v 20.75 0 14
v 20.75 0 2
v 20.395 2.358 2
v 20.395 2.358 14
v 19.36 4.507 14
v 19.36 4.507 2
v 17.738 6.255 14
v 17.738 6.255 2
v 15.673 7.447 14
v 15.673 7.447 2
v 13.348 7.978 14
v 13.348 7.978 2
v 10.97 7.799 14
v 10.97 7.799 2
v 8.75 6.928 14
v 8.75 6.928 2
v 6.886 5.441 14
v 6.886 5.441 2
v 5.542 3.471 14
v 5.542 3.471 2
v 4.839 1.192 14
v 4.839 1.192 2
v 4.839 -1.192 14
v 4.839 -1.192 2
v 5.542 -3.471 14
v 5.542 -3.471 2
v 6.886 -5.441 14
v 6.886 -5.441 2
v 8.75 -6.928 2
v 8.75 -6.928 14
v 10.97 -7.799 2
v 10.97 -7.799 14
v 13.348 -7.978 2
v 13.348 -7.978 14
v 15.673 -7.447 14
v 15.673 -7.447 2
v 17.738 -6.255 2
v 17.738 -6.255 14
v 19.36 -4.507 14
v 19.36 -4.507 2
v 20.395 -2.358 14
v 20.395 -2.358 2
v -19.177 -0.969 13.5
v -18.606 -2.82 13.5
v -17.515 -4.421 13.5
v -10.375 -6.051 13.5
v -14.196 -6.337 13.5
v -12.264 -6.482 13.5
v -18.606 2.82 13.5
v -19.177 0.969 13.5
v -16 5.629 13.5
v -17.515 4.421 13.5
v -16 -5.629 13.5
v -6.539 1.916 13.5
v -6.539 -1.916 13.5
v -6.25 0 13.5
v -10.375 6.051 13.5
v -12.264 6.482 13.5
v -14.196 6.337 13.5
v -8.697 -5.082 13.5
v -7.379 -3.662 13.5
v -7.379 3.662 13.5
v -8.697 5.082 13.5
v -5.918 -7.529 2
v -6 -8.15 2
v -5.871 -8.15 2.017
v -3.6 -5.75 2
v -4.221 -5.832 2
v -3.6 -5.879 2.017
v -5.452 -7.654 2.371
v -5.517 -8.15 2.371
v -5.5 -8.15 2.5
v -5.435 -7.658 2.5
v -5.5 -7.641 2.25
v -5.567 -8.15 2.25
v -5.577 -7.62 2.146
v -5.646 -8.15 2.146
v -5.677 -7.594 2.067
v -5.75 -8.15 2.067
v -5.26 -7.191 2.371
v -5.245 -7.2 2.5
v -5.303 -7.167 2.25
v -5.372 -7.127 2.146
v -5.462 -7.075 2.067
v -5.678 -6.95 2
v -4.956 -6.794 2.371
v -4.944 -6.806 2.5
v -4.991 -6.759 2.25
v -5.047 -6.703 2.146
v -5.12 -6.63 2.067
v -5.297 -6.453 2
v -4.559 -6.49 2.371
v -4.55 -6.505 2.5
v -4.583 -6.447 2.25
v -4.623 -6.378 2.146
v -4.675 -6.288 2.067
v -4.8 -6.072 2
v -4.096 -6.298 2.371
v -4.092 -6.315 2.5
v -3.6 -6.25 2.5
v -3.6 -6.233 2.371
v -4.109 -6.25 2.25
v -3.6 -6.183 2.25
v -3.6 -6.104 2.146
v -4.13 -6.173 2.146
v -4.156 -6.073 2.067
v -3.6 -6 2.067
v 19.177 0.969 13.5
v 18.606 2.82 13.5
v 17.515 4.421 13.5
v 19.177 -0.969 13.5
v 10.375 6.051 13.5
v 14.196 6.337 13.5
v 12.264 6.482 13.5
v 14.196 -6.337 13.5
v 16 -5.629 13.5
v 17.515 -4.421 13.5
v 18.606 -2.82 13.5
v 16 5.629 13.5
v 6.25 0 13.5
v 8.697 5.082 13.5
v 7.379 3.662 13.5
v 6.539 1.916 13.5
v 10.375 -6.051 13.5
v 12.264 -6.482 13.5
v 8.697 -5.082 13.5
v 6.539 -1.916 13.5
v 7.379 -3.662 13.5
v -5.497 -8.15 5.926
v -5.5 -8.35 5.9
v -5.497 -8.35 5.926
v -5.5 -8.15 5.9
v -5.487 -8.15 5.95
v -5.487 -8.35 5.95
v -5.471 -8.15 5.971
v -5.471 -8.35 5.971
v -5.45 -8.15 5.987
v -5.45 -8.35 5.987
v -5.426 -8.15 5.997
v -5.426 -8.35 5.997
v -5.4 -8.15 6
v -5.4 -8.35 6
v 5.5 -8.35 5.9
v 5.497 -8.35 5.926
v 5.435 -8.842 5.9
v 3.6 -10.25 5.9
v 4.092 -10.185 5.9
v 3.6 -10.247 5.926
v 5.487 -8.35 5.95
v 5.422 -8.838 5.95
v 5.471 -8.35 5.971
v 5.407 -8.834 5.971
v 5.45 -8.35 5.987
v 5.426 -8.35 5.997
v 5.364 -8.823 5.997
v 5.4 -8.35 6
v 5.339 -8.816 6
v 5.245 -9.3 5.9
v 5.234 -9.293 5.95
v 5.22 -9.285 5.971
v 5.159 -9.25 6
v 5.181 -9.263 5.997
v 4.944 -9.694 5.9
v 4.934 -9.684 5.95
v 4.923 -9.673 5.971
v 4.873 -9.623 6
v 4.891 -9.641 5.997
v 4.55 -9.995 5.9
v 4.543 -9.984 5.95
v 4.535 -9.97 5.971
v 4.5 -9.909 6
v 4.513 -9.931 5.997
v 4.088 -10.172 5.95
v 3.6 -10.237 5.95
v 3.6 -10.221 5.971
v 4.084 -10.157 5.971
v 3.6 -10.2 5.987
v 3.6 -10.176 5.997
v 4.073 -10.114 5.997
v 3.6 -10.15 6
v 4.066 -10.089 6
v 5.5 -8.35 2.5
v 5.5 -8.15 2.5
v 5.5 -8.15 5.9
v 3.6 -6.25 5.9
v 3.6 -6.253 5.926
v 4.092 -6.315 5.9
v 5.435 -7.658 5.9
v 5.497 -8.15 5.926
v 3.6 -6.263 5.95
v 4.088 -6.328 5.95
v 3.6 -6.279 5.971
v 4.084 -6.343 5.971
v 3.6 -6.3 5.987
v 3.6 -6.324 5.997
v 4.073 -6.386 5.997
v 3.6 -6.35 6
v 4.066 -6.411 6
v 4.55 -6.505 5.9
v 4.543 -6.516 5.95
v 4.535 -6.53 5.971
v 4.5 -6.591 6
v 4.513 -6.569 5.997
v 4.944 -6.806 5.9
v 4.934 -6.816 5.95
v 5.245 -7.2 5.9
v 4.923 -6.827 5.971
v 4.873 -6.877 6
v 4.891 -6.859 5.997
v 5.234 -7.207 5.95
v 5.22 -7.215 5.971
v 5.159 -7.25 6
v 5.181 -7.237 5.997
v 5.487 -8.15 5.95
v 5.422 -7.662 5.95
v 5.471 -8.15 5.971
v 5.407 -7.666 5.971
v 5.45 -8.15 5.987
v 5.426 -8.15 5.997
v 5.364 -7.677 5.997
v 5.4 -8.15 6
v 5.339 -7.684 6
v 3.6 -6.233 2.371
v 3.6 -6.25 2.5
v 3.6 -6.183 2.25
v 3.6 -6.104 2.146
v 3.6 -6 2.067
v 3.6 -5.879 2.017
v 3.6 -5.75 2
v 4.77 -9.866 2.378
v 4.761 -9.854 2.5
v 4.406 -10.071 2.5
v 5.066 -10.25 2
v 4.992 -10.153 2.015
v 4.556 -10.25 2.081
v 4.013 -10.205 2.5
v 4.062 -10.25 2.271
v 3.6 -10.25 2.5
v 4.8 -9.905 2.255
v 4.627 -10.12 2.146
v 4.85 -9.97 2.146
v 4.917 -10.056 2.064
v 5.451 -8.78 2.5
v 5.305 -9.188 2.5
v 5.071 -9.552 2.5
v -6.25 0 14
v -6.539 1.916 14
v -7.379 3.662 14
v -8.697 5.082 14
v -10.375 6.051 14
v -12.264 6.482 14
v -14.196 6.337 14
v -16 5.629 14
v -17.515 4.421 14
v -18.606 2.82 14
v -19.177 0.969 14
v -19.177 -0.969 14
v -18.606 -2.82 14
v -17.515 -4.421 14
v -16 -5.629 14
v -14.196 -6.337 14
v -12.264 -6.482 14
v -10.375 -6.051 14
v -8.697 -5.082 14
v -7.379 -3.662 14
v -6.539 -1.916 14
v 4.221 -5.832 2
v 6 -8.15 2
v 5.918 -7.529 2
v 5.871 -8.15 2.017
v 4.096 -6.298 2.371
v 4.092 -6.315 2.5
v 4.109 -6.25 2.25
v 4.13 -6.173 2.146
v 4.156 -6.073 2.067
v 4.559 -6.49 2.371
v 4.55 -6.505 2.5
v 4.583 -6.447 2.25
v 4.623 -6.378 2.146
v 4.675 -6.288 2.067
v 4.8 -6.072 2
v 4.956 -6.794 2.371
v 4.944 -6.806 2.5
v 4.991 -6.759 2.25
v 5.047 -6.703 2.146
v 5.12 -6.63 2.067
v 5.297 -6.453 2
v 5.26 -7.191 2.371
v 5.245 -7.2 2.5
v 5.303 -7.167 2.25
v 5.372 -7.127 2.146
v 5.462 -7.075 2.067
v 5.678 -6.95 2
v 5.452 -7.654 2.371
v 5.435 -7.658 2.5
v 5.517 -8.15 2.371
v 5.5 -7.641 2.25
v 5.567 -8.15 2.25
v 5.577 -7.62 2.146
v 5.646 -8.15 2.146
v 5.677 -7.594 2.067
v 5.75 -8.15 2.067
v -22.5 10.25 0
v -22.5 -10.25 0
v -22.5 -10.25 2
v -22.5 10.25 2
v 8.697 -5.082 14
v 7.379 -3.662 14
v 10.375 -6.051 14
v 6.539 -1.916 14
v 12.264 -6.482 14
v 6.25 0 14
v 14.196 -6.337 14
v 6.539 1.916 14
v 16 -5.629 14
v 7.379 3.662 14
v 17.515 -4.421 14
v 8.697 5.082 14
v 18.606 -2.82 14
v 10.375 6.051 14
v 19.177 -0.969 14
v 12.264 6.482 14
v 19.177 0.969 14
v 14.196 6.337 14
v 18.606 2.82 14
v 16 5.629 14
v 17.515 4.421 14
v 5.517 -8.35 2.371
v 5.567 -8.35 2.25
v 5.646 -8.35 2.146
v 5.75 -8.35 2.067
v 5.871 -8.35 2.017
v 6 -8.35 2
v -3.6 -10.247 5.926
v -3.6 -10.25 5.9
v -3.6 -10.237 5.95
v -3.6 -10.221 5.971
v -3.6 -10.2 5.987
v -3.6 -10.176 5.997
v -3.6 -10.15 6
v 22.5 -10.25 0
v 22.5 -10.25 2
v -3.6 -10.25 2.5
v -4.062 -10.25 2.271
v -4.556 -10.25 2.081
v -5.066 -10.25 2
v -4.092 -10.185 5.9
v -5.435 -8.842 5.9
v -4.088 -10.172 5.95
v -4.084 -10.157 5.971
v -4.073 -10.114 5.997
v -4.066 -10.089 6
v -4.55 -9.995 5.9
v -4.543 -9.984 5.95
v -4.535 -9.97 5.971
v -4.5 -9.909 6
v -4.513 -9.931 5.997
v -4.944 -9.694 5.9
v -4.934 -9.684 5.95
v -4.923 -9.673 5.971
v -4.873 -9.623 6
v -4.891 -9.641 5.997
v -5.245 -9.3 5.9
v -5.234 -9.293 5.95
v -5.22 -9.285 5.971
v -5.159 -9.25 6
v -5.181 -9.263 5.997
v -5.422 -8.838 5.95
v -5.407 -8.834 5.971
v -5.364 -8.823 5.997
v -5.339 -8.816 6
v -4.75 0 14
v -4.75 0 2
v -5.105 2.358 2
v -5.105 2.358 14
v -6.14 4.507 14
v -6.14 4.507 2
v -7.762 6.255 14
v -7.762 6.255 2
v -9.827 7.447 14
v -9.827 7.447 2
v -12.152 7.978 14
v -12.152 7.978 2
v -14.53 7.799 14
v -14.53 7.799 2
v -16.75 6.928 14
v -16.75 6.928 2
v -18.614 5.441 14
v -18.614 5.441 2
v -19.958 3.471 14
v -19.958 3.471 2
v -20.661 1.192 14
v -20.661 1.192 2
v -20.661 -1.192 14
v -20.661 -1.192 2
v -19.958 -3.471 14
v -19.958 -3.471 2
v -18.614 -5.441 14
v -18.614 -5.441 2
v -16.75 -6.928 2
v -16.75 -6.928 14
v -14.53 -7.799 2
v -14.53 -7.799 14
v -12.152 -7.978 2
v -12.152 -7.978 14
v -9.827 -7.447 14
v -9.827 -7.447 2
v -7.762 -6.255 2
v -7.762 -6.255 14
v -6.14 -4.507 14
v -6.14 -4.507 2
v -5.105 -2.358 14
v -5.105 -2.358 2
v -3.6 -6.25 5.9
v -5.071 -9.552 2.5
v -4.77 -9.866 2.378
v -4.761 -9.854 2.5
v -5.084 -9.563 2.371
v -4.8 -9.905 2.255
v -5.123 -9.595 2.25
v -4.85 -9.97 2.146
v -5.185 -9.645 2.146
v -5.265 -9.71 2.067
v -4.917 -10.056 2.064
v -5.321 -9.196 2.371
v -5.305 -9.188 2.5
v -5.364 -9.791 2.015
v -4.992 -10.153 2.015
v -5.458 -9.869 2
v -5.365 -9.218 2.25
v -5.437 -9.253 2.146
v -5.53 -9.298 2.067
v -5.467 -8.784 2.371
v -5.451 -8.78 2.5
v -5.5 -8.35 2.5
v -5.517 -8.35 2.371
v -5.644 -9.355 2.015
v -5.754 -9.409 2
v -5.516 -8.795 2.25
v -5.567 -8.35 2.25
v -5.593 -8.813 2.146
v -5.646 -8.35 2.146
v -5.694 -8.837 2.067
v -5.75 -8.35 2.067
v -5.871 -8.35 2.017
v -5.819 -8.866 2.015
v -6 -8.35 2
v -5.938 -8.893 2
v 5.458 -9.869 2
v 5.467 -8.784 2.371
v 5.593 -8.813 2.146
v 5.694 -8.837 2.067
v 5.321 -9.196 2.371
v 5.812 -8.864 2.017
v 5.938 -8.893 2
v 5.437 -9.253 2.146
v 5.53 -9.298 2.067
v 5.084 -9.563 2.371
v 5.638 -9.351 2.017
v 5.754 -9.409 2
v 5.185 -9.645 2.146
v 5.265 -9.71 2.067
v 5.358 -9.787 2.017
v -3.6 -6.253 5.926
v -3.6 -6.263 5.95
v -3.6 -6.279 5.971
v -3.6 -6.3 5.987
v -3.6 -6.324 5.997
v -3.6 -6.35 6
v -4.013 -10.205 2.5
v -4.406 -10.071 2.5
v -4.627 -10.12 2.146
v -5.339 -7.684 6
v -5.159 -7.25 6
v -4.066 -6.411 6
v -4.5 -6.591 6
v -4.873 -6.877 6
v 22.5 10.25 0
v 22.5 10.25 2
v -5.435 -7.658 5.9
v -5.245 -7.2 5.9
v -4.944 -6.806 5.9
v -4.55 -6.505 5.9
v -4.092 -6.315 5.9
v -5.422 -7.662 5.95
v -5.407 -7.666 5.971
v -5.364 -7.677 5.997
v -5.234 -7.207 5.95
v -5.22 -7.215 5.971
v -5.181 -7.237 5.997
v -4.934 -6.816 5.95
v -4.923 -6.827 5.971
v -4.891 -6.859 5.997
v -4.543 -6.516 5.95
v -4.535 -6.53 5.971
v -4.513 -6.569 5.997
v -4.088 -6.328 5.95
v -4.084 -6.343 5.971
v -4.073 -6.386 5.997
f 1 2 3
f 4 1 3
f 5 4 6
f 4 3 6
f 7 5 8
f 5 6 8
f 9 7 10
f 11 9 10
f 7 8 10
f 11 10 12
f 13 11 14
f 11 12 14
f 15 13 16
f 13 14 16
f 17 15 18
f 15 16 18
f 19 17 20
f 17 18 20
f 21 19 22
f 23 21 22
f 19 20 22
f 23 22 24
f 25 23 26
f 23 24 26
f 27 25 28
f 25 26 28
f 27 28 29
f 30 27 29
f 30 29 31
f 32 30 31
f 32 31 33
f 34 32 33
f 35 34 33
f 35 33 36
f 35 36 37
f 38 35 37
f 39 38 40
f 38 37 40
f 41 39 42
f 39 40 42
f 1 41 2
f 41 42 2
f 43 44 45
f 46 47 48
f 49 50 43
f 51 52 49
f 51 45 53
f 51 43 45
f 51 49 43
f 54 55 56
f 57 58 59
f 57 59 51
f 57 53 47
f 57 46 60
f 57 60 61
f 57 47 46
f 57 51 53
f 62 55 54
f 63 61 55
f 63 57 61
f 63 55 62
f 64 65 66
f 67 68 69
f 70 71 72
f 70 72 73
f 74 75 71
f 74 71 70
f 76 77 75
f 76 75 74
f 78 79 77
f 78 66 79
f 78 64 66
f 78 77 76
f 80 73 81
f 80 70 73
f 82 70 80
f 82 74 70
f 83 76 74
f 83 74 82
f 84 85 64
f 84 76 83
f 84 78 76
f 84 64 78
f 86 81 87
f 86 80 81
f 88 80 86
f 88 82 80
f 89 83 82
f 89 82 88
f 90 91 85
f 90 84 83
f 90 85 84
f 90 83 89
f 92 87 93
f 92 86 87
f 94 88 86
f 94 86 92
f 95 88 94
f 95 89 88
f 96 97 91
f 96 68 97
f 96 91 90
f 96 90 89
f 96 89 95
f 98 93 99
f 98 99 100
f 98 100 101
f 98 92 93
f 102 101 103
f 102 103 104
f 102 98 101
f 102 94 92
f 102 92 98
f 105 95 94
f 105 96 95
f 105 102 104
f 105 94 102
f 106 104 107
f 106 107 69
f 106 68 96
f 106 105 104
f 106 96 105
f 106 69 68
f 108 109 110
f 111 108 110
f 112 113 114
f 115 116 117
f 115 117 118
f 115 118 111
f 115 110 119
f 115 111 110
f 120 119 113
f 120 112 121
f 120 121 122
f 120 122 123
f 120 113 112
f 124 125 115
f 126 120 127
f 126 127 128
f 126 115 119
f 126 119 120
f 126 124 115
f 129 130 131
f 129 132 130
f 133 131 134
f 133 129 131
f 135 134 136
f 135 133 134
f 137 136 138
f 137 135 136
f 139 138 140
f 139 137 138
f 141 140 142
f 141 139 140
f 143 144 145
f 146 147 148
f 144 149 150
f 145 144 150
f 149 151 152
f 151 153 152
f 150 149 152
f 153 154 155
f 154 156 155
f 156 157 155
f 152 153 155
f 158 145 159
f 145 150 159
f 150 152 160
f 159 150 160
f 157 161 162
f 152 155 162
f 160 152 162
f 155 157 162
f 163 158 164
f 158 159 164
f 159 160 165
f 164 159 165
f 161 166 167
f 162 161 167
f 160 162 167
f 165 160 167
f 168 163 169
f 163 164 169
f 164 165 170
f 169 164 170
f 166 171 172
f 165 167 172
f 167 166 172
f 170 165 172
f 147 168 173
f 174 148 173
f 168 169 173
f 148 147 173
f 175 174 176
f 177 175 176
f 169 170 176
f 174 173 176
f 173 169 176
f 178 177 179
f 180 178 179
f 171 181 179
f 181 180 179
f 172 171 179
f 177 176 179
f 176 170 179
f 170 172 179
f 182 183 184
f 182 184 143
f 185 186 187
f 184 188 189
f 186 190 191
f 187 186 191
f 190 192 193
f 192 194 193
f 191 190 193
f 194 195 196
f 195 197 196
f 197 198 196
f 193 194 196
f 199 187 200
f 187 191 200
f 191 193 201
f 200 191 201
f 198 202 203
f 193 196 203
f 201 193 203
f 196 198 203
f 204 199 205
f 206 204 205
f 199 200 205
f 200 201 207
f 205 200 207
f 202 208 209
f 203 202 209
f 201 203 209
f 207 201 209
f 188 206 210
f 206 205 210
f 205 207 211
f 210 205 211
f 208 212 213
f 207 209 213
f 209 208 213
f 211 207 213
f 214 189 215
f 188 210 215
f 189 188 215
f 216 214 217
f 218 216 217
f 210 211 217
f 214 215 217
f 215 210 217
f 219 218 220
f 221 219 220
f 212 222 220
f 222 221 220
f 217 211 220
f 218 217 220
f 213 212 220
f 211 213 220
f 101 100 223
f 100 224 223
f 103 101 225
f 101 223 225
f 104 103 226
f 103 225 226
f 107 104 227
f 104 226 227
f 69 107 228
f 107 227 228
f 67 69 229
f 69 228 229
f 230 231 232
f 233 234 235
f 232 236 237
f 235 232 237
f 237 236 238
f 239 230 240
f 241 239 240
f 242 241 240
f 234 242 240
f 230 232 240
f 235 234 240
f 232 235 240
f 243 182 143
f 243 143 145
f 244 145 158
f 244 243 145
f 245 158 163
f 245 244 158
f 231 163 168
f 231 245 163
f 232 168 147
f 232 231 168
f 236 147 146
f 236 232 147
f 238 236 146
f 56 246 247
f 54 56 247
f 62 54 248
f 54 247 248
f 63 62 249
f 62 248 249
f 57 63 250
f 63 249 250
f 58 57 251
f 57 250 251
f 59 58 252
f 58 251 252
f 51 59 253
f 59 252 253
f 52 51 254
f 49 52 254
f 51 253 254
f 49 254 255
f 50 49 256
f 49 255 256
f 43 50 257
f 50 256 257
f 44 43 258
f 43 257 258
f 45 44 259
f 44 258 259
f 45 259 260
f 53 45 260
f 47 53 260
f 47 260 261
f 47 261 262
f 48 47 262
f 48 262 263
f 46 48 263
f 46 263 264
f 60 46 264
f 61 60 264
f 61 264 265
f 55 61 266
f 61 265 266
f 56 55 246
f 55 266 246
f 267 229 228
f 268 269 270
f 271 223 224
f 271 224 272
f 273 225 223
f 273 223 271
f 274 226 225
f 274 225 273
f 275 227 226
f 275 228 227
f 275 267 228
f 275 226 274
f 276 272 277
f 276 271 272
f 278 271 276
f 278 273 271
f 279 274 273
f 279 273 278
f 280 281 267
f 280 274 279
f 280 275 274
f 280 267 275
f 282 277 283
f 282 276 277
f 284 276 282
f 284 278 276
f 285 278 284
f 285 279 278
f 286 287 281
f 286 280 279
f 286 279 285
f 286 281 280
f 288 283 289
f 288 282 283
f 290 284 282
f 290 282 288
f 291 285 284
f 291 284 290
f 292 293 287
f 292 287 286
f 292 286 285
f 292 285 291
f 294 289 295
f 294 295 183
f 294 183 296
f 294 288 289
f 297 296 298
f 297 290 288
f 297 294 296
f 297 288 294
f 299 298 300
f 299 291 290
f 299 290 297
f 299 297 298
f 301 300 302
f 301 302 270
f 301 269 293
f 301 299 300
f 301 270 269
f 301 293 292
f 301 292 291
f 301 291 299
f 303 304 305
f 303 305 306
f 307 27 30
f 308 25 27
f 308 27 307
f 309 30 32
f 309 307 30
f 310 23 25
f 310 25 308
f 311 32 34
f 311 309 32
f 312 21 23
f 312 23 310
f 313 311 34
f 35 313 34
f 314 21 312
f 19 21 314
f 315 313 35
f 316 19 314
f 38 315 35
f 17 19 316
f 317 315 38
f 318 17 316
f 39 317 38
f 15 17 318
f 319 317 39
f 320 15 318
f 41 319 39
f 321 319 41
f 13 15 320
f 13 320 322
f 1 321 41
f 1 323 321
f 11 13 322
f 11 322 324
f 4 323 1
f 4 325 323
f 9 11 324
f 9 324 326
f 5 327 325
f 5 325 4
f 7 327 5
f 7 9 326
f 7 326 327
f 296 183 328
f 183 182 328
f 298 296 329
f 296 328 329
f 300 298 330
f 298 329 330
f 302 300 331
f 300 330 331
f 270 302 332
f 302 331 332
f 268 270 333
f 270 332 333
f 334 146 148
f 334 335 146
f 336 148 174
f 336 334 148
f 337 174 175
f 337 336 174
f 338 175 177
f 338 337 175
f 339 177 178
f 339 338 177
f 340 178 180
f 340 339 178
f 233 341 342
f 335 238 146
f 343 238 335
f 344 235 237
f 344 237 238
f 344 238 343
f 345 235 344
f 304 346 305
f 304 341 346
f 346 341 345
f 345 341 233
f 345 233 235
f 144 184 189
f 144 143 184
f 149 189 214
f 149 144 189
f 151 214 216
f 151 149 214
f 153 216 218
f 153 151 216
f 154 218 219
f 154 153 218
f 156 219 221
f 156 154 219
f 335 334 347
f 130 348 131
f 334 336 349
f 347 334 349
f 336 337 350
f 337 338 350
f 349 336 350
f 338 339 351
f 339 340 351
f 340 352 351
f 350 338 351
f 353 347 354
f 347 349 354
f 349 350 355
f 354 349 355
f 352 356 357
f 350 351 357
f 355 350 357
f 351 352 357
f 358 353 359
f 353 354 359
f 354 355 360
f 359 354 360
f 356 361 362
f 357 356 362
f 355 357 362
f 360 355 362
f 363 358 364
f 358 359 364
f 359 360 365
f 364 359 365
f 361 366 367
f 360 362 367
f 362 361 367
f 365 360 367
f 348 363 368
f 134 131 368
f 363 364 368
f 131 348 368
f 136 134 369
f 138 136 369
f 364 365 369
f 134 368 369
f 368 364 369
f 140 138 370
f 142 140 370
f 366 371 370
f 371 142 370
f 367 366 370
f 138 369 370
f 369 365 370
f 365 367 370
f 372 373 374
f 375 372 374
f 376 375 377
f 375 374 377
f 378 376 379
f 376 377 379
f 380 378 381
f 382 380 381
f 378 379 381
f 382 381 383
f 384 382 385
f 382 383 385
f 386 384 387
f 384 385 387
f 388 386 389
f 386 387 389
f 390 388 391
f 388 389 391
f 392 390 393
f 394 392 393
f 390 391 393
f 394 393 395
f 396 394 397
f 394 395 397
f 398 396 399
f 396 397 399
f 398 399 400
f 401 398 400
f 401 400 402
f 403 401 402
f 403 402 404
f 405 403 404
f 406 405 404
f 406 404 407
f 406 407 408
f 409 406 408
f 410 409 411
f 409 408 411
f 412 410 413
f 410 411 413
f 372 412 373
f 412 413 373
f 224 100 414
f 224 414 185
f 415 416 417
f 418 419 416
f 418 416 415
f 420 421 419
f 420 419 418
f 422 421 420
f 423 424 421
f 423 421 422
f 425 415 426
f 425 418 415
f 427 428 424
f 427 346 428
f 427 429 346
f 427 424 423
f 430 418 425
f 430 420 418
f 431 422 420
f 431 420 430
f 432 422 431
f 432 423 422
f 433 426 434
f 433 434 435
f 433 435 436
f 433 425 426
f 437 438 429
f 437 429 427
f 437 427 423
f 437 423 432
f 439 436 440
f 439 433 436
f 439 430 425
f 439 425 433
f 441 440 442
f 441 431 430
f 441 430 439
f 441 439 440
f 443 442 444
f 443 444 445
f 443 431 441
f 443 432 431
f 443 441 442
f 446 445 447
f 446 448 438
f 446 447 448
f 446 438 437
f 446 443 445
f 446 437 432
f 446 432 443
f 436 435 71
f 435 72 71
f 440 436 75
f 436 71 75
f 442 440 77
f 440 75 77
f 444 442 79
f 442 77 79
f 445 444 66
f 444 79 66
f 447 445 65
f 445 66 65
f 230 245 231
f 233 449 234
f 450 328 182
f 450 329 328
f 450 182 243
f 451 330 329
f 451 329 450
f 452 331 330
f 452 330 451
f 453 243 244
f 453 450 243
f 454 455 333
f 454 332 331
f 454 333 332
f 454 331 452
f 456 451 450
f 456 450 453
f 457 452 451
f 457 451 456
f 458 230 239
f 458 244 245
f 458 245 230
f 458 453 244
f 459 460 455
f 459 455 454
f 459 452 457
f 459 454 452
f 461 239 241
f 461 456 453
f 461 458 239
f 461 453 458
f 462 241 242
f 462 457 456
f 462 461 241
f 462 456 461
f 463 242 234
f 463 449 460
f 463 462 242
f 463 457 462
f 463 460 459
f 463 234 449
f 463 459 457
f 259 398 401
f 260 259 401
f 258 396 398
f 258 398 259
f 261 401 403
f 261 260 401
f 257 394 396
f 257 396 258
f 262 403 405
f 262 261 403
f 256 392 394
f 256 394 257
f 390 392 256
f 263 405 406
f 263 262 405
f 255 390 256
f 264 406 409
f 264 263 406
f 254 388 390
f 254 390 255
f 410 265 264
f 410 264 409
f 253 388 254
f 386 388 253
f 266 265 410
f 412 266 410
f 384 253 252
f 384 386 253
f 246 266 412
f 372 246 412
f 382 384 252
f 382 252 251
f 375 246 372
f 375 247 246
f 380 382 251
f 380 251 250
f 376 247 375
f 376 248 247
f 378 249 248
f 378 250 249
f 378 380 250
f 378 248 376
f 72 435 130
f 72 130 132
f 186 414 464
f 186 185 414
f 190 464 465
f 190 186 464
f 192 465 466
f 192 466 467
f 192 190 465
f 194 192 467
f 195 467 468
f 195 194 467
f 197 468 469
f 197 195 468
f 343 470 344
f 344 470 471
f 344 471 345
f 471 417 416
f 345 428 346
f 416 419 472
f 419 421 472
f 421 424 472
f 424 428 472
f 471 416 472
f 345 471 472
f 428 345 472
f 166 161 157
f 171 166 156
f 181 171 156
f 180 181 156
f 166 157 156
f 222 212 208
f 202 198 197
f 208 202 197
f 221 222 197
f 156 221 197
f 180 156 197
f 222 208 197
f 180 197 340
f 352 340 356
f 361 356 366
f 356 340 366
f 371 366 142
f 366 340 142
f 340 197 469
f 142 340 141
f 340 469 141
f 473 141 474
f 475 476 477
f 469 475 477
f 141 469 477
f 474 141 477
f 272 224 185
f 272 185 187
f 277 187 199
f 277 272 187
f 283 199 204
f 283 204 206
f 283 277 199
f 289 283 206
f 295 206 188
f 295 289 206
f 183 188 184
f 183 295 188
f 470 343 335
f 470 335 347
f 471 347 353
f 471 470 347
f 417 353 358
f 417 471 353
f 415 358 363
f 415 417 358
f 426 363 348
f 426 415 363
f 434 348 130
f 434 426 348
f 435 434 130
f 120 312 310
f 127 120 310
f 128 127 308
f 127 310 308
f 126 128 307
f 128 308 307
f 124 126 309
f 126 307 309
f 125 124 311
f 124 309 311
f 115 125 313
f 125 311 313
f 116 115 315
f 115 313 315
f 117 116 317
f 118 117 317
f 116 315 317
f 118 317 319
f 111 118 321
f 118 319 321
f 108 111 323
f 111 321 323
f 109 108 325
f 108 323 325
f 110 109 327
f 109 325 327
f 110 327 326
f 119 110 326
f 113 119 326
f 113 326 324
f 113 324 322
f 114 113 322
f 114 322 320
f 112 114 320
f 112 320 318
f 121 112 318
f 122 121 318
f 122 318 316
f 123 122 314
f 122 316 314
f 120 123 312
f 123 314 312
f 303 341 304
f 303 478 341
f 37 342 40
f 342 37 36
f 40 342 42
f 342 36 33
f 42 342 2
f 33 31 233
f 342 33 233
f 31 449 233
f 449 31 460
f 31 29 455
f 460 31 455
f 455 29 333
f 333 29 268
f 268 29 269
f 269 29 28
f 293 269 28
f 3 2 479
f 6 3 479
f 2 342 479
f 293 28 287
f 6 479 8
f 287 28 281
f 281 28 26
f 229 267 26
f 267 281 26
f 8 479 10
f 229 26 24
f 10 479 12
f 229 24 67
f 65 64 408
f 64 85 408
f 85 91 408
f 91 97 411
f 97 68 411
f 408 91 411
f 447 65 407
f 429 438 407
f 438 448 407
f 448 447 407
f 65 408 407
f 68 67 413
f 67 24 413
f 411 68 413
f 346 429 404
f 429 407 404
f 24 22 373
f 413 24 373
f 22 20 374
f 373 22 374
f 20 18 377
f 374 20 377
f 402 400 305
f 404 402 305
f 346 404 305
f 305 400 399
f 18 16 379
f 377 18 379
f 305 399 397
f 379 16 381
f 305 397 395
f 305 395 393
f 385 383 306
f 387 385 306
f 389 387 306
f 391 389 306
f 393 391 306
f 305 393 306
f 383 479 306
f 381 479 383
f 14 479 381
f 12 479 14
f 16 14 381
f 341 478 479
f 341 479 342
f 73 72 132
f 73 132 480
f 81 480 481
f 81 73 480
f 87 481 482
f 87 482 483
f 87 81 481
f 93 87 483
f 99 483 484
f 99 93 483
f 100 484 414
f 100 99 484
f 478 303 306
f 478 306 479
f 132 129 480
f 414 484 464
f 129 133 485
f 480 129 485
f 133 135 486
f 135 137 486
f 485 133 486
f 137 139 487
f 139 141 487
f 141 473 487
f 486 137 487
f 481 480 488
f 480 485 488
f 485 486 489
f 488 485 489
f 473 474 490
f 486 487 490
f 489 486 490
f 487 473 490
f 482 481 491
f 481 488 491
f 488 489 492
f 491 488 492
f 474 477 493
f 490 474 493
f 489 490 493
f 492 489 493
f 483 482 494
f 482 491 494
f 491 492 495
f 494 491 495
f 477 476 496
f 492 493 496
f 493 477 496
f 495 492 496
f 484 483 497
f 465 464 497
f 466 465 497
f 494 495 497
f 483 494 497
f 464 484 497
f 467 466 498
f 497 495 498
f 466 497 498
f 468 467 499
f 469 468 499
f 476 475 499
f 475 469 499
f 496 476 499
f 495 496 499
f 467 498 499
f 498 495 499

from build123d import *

# Parameters (mm, degrees)
BOSS_EXTRUDE1_DEPTH = 2
SKETCH2_R           = 7.999999999999998
BOSS_EXTRUDE2_DEPTH = 12
SKETCH3_R           = 6.499999999999999
SKETCH3_R_2         = 6.5
CUT_EXTRUDE1_DEPTH  = 0.5
BOSS_EXTRUDE3_DEPTH = 4
FILLET1_R           = 0.1
FILLET2_R           = 0.5


with BuildPart() as part:
    # Sketch1 → Boss-Extrude1 (new body)
    with BuildSketch(Plane.XY):
        Polygon((22.499999999999993, -10.249999999999996), (-22.500000000000007, -10.25), (-22.500000000000007, 10.25), (22.499999999999993, 10.250000000000005), align=None)
    extrude(amount=BOSS_EXTRUDE1_DEPTH)

    # Sketch2 → Boss-Extrude2 (add)
    with BuildSketch(Plane.XY.offset(2)):
        with Locations((-12.750000000000004, 1.12e-15)):
            Circle(SKETCH2_R)
        with Locations((12.749999999999998, 1.12e-15)):
            Circle(SKETCH2_R)
    extrude(amount=BOSS_EXTRUDE2_DEPTH)

    # Sketch3 → Cut-Extrude1 (cut)
    with BuildSketch(Plane.XY.offset(14)):
        with Locations((-12.750000000000004, 1.12e-15)):
            Circle(SKETCH3_R)
        with Locations(Location((12.749999999999991, -2.316e-14, 0), (0, 0, 180))):
            Circle(SKETCH3_R_2)
    extrude(amount=-CUT_EXTRUDE1_DEPTH, mode=Mode.SUBTRACT)

    # Sketch4 → Boss-Extrude3 (add)
    with BuildSketch(Plane.XY.offset(2)):
        with BuildLine():
            Line((3.5999999999999757, -10.249999999999995), (-3.5999999999999965, -10.249999999999996))
            ThreePointArc((-3.5999999999999965, -10.249999999999996), (-4.943502884254451, -9.693502884254437), (-5.50000000000001, -8.349999999999982))
            Line((-5.50000000000001, -8.349999999999982), (-5.50000000000001, -8.15000000000001))
            ThreePointArc((-5.50000000000001, -8.15000000000001), (-4.943502884254451, -6.8064971157455565), (-3.5999999999999965, -6.2499999999999964))
            Line((-3.5999999999999965, -6.2499999999999964), (3.5999999999999757, -6.249999999999996))
            ThreePointArc((3.5999999999999757, -6.249999999999996), (4.943502884254429, -6.806497115745555), (5.499999999999989, -8.150000000000007))
            Line((5.499999999999989, -8.150000000000007), (5.499999999999989, -8.349999999999982))
            ThreePointArc((5.499999999999989, -8.349999999999982), (4.943502884254429, -9.693502884254436), (3.5999999999999757, -10.249999999999995))
        make_face()
    extrude(amount=BOSS_EXTRUDE3_DEPTH)

    # Fillet1
    fillet1_edges = [part.edges().sort_by_distance(p)[0] for p in [
        (4.94350288425443, -9.693502884254436, 6),
        (5.499999999999989, -8.249999999999995, 6),
        (4.943502884254428, -6.806497115745555, 6),
        (-1.021e-14, -6.2499999999999964, 6),
        (-4.94350288425445, -6.8064971157455565, 6),
        (-5.50000000000001, -8.249999999999996, 6),
        (-4.943502884254451, -9.693502884254437, 6),
        (-1.066e-14, -10.249999999999996, 6),
    ]]
    fillet(fillet1_edges, radius=FILLET1_R)

    # Fillet2
    fillet2_edges = [part.edges().sort_by_distance(p)[0] for p in [
        (4.94350288425443, -9.693502884254436, 2),
        (5.499999999999989, -8.249999999999995, 2),
        (4.943502884254428, -6.806497115745555, 2),
        (-1.021e-14, -6.2499999999999964, 2),
        (-4.94350288425445, -6.8064971157455565, 2),
        (-5.50000000000001, -8.249999999999996, 2),
        (-4.943502884254451, -9.693502884254437, 2),
    ]]
    fillet(fillet2_edges, radius=FILLET2_R)


solid = part.part
